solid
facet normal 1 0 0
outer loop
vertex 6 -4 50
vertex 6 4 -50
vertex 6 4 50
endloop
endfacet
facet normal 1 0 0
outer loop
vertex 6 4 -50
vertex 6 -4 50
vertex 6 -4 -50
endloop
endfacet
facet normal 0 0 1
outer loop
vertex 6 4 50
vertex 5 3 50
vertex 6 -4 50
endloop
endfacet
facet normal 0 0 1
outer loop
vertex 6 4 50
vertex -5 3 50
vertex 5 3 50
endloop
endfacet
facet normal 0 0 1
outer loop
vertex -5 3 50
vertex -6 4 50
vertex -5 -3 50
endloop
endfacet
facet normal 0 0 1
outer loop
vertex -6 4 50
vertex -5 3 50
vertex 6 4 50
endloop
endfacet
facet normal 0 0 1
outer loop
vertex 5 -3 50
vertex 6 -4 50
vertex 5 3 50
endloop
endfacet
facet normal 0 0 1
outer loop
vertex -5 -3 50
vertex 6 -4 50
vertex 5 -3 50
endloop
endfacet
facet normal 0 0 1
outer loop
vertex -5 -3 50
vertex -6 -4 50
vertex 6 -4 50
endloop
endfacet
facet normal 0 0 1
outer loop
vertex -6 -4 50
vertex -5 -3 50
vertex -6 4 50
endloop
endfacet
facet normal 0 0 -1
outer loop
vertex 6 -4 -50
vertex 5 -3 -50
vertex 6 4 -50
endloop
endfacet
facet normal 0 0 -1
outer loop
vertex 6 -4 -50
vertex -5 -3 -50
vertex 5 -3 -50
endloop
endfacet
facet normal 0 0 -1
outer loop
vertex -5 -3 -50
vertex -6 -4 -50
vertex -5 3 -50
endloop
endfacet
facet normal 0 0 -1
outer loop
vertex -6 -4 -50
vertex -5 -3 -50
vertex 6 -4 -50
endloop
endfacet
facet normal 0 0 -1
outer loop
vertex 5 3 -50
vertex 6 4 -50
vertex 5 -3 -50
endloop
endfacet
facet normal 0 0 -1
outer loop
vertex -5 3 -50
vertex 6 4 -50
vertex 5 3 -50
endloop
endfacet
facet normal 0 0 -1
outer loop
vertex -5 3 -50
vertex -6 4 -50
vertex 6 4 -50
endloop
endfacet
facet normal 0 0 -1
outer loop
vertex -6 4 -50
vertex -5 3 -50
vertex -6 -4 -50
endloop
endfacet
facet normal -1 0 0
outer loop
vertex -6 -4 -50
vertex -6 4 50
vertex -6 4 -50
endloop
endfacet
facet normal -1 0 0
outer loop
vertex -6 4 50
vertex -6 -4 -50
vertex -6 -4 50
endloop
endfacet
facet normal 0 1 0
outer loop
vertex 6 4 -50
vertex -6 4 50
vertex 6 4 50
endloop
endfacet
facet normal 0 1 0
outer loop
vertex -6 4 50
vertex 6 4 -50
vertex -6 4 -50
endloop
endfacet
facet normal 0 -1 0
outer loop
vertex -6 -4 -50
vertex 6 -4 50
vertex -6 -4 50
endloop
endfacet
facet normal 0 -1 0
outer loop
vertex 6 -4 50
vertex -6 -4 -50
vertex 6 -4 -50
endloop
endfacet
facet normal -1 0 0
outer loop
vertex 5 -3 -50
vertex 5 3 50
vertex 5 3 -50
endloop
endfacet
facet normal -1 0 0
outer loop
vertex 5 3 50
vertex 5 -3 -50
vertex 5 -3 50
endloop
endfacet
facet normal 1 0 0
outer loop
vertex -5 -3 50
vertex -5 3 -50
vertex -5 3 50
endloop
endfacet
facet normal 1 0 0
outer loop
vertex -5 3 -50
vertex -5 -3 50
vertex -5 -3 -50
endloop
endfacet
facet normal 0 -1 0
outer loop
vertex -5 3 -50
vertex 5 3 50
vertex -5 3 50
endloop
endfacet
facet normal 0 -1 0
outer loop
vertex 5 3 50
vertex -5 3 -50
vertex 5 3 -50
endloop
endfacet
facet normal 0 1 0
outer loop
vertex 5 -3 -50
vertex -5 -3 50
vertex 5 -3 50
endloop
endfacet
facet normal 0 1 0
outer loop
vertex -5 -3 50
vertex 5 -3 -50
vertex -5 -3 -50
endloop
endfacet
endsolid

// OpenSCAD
module rectangular_tube(length=100, outer_w=12, outer_h=8, wall=1) {
    eps = 0.02;

    inner_w = outer_w - 2*wall;
    inner_h = outer_h - 2*wall;

    assert(length > 0, "Length must be > 0.");
    assert(wall > 0, "Wall thickness must be > 0.");
    assert(inner_w > 0 && inner_h > 0, "Wall thickness too large for given outer dimensions.");

    difference() {
        // Outer solid
        cube([outer_w, outer_h, length], center=true);

        // Inner void: slightly longer to guarantee a clean through-cut
        cube([inner_w, inner_h, length + 2*eps], center=true);
    }
}

// 12mm x 8mm x 1mm wall, 100mm long
rectangular_tube(length=100, outer_w=12, outer_h=8, wall=1);
